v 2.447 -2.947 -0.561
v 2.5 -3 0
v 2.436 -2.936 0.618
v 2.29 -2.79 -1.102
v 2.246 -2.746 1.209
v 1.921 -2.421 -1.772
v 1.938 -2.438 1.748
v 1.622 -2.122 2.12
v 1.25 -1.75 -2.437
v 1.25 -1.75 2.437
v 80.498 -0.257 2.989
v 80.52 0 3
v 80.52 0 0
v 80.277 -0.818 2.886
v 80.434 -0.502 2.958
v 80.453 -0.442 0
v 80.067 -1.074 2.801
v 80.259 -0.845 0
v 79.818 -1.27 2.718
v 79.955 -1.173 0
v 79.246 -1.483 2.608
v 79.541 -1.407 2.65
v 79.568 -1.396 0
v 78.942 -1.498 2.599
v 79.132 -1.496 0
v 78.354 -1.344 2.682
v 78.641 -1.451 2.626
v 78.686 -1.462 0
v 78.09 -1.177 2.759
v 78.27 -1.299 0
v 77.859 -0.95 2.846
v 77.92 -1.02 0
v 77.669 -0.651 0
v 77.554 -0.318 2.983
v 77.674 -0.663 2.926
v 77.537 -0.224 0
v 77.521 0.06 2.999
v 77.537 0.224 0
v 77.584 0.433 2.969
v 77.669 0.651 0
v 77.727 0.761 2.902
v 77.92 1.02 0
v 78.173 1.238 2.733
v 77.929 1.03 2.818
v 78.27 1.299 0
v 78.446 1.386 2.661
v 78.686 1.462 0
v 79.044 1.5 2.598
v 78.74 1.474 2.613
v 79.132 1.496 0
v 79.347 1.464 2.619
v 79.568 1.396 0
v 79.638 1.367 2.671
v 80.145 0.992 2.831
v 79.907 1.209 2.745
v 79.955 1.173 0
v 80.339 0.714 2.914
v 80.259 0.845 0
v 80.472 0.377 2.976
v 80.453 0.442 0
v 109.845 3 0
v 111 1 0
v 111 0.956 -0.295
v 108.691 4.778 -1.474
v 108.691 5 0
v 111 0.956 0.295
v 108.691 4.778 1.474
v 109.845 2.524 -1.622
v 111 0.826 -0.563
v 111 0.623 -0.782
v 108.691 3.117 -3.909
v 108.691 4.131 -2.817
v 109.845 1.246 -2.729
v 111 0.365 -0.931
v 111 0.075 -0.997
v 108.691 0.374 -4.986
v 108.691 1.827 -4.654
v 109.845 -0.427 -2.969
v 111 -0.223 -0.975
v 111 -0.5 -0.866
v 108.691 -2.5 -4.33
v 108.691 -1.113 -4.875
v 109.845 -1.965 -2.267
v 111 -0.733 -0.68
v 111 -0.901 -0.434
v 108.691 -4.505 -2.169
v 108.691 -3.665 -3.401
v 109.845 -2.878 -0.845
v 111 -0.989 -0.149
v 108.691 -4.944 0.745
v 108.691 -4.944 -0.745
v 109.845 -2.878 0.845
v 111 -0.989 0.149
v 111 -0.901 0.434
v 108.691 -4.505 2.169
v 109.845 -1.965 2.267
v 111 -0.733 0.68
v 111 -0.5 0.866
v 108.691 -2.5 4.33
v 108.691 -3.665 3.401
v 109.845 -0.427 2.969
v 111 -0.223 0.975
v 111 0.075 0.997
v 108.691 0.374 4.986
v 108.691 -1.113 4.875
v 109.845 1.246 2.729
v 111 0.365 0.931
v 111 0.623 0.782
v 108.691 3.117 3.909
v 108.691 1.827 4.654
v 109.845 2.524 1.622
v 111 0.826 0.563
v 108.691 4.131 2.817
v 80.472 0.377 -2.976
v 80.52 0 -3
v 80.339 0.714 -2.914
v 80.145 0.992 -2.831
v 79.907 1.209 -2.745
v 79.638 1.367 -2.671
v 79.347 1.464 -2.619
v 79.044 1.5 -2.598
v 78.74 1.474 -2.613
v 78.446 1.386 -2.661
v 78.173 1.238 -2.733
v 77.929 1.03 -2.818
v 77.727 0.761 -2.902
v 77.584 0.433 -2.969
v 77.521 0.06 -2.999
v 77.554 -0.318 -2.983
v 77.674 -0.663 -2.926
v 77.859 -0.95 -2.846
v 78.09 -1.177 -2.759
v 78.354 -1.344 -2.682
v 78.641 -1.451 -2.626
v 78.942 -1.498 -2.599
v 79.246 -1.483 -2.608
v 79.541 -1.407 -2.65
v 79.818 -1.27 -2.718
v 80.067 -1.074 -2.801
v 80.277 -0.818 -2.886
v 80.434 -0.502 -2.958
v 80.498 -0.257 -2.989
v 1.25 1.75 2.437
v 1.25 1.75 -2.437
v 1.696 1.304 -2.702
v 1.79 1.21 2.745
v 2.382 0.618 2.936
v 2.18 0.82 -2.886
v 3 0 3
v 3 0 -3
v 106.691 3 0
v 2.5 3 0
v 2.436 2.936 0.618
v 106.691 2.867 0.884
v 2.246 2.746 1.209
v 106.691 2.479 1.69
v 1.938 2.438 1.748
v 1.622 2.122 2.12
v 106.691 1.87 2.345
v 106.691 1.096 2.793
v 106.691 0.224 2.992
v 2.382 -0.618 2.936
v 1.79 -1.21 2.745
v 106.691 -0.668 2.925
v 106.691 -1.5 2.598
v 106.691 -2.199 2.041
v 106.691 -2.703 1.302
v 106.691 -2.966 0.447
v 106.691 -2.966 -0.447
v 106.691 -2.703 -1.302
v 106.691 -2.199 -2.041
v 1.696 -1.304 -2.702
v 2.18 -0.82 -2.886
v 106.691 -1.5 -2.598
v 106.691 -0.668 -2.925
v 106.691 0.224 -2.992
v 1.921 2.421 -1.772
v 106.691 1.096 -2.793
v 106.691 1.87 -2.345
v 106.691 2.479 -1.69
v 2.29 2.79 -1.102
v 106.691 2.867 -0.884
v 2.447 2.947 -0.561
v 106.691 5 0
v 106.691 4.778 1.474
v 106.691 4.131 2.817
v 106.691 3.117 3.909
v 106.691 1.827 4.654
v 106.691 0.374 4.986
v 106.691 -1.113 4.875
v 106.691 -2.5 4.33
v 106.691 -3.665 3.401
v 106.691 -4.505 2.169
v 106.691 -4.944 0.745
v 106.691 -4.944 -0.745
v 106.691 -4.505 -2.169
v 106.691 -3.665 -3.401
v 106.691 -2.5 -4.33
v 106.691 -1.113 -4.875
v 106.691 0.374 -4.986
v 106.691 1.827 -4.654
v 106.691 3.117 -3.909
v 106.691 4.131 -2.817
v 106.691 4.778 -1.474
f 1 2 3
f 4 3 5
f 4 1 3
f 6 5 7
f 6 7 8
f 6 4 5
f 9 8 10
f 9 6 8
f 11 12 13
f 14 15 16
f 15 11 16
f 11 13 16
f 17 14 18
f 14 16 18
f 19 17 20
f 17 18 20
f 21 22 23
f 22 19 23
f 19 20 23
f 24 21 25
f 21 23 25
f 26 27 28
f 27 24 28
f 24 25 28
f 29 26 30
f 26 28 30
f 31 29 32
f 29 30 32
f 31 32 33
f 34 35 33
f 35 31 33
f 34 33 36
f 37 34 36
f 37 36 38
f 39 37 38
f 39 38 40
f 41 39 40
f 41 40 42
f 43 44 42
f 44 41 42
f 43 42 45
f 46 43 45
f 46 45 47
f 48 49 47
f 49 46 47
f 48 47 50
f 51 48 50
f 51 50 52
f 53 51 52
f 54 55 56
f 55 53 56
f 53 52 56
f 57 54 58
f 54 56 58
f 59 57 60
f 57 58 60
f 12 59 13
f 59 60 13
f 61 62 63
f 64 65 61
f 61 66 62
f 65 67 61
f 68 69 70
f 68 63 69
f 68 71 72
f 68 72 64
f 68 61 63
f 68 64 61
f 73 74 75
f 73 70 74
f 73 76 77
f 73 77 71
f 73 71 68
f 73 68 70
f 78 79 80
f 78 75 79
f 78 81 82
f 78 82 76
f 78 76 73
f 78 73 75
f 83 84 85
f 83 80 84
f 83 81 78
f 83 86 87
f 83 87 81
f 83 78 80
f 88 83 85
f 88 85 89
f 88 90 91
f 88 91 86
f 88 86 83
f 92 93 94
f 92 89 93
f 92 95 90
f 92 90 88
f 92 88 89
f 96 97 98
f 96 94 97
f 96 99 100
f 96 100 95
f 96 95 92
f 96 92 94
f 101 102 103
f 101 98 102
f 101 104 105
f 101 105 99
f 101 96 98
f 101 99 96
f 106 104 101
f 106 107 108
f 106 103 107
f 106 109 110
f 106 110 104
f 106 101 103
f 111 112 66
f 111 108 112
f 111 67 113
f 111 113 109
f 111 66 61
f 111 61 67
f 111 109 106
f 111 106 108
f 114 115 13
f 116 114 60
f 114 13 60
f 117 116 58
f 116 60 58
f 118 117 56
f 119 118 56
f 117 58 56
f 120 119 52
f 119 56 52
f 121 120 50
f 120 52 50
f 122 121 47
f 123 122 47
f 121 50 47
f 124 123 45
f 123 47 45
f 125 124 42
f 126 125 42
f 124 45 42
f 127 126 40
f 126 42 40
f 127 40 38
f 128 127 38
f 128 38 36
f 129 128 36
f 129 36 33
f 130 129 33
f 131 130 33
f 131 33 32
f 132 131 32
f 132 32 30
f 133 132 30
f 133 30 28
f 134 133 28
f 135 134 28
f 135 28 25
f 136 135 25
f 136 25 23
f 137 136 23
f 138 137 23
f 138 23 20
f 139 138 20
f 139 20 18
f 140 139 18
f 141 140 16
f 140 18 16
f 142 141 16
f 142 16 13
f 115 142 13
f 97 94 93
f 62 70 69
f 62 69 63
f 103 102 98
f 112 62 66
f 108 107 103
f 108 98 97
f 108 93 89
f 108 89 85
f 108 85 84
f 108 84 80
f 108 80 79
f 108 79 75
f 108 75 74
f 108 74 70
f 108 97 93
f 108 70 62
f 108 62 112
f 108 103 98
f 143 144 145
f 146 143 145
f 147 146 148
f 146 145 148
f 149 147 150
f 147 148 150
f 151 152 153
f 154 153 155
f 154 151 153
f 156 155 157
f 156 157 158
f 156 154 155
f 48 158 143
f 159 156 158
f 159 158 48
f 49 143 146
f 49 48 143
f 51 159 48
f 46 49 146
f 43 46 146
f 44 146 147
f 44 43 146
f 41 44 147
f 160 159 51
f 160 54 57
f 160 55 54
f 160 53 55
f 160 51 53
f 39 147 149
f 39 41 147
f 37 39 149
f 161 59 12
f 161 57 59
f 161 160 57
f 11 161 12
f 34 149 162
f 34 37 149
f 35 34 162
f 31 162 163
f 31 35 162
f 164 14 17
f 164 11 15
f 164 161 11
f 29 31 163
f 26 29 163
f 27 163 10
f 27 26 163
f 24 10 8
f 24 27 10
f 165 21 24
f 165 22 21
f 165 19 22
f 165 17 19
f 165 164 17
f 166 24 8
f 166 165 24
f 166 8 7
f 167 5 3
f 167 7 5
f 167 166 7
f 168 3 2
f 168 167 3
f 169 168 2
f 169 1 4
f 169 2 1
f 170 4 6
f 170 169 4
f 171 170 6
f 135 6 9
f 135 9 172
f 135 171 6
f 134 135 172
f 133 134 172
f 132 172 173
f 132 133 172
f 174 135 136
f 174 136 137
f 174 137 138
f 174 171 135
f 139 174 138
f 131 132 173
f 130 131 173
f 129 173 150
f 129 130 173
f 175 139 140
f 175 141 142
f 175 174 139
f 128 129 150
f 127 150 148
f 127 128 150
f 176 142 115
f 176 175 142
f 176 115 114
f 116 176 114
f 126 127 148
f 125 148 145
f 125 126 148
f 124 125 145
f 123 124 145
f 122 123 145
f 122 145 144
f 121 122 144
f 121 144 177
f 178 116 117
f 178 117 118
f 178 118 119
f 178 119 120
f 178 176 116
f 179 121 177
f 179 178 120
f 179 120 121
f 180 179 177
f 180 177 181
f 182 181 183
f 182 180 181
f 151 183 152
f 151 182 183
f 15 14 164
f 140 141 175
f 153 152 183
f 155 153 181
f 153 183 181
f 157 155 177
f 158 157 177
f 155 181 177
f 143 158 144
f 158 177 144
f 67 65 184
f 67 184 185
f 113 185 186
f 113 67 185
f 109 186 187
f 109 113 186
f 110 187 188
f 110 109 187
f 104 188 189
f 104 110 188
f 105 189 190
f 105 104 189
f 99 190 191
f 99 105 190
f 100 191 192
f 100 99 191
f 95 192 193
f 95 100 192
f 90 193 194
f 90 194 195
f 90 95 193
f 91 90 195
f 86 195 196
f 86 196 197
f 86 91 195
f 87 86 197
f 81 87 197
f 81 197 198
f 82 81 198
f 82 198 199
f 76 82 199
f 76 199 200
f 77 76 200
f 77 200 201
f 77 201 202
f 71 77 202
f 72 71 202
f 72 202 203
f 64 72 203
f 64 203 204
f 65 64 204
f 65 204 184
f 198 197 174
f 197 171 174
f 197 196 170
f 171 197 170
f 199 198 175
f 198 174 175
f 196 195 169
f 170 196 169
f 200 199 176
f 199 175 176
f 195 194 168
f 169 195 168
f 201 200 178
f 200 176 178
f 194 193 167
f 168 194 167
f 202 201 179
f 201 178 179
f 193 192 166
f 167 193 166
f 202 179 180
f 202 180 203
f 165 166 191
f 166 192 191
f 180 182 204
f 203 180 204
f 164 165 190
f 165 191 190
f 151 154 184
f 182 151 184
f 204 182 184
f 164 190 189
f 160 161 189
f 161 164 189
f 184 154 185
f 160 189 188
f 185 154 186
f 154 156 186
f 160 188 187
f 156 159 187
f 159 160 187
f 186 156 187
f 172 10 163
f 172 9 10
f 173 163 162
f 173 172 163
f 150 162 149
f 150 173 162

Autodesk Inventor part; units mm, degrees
ref_plane "YZ Plane" through (0, 0, 0) normal (1, 0, 0) x (0, 1, 0)
ref_plane "XZ Plane" through (0, 0, 0) normal (0, 1, 0) x (-1, 0, 0)
ref_plane "XY Plane" through (0, 0, 0) normal (0, 0, 1) x (1, 0, 0)
sketch "Sketch1" plane through (0, 0, 0) normal (0, 0, 1) x (1, 0, 0)
  line L0 (-22.3155, 0) -> (133.8928, 0) projected
  line L1 (0, -4.6) -> (0, 6.6) projected
  line L2 (0, 3) -> (106.6906, 3)
  line L3 (106.6906, 3) -> (106.6906, 5)
  line L4 (106.6906, 5) -> (108.6906, 5)
  line L5 (108.6906, 5) -> (111.5774, 0)
  line L6 (0, 3) -> (3, 0)
  line L7 (0, 3) -> (0, 0)
  line L8 (111, 1) -> (111, 0)
  line L9 (0, -3) -> (3, 0)
  circle A0 centre (79.02, 0) radius 1.5
  line L10 (2.5, 3) -> (1.25, 1.75)
  line L11 (0, -3) -> (106.6906, -3)
  line L12 (2.5, -3) -> (1.25, -1.75)
  dimension "d0" = 6
  dimension "d1" = 3
  dimension "d2" = 60
  dimension "d3" = 2
  dimension "d4" = 10
  dimension "d5" = 2
  dimension "d6" = 111
  dimension "d10" = 3
  dimension "d14" = 2.5
  dimension "d16" = 31.98
revolve "Revolution1" add sketch "Sketch1" angle 360 about axis through (-10, 0, 0) along (1, 0, 0) picked at (79.1973, 0.4675) contours L6 L10 L2 L3 L4 L5 L8 L0 A0 | L2 L10 L6 | A0 L0
extrude "Extrusion1" cut sketch "Sketch1" along normal through all both and the other way through all contours L1 L6 L0 | L0 L9 L1 | L9 L12 L11 | L2 L10 L6 | A0 L0 | L0 A0
equation "\"d1\" = 0.5 * d0"
properties part number "TW1-002"
